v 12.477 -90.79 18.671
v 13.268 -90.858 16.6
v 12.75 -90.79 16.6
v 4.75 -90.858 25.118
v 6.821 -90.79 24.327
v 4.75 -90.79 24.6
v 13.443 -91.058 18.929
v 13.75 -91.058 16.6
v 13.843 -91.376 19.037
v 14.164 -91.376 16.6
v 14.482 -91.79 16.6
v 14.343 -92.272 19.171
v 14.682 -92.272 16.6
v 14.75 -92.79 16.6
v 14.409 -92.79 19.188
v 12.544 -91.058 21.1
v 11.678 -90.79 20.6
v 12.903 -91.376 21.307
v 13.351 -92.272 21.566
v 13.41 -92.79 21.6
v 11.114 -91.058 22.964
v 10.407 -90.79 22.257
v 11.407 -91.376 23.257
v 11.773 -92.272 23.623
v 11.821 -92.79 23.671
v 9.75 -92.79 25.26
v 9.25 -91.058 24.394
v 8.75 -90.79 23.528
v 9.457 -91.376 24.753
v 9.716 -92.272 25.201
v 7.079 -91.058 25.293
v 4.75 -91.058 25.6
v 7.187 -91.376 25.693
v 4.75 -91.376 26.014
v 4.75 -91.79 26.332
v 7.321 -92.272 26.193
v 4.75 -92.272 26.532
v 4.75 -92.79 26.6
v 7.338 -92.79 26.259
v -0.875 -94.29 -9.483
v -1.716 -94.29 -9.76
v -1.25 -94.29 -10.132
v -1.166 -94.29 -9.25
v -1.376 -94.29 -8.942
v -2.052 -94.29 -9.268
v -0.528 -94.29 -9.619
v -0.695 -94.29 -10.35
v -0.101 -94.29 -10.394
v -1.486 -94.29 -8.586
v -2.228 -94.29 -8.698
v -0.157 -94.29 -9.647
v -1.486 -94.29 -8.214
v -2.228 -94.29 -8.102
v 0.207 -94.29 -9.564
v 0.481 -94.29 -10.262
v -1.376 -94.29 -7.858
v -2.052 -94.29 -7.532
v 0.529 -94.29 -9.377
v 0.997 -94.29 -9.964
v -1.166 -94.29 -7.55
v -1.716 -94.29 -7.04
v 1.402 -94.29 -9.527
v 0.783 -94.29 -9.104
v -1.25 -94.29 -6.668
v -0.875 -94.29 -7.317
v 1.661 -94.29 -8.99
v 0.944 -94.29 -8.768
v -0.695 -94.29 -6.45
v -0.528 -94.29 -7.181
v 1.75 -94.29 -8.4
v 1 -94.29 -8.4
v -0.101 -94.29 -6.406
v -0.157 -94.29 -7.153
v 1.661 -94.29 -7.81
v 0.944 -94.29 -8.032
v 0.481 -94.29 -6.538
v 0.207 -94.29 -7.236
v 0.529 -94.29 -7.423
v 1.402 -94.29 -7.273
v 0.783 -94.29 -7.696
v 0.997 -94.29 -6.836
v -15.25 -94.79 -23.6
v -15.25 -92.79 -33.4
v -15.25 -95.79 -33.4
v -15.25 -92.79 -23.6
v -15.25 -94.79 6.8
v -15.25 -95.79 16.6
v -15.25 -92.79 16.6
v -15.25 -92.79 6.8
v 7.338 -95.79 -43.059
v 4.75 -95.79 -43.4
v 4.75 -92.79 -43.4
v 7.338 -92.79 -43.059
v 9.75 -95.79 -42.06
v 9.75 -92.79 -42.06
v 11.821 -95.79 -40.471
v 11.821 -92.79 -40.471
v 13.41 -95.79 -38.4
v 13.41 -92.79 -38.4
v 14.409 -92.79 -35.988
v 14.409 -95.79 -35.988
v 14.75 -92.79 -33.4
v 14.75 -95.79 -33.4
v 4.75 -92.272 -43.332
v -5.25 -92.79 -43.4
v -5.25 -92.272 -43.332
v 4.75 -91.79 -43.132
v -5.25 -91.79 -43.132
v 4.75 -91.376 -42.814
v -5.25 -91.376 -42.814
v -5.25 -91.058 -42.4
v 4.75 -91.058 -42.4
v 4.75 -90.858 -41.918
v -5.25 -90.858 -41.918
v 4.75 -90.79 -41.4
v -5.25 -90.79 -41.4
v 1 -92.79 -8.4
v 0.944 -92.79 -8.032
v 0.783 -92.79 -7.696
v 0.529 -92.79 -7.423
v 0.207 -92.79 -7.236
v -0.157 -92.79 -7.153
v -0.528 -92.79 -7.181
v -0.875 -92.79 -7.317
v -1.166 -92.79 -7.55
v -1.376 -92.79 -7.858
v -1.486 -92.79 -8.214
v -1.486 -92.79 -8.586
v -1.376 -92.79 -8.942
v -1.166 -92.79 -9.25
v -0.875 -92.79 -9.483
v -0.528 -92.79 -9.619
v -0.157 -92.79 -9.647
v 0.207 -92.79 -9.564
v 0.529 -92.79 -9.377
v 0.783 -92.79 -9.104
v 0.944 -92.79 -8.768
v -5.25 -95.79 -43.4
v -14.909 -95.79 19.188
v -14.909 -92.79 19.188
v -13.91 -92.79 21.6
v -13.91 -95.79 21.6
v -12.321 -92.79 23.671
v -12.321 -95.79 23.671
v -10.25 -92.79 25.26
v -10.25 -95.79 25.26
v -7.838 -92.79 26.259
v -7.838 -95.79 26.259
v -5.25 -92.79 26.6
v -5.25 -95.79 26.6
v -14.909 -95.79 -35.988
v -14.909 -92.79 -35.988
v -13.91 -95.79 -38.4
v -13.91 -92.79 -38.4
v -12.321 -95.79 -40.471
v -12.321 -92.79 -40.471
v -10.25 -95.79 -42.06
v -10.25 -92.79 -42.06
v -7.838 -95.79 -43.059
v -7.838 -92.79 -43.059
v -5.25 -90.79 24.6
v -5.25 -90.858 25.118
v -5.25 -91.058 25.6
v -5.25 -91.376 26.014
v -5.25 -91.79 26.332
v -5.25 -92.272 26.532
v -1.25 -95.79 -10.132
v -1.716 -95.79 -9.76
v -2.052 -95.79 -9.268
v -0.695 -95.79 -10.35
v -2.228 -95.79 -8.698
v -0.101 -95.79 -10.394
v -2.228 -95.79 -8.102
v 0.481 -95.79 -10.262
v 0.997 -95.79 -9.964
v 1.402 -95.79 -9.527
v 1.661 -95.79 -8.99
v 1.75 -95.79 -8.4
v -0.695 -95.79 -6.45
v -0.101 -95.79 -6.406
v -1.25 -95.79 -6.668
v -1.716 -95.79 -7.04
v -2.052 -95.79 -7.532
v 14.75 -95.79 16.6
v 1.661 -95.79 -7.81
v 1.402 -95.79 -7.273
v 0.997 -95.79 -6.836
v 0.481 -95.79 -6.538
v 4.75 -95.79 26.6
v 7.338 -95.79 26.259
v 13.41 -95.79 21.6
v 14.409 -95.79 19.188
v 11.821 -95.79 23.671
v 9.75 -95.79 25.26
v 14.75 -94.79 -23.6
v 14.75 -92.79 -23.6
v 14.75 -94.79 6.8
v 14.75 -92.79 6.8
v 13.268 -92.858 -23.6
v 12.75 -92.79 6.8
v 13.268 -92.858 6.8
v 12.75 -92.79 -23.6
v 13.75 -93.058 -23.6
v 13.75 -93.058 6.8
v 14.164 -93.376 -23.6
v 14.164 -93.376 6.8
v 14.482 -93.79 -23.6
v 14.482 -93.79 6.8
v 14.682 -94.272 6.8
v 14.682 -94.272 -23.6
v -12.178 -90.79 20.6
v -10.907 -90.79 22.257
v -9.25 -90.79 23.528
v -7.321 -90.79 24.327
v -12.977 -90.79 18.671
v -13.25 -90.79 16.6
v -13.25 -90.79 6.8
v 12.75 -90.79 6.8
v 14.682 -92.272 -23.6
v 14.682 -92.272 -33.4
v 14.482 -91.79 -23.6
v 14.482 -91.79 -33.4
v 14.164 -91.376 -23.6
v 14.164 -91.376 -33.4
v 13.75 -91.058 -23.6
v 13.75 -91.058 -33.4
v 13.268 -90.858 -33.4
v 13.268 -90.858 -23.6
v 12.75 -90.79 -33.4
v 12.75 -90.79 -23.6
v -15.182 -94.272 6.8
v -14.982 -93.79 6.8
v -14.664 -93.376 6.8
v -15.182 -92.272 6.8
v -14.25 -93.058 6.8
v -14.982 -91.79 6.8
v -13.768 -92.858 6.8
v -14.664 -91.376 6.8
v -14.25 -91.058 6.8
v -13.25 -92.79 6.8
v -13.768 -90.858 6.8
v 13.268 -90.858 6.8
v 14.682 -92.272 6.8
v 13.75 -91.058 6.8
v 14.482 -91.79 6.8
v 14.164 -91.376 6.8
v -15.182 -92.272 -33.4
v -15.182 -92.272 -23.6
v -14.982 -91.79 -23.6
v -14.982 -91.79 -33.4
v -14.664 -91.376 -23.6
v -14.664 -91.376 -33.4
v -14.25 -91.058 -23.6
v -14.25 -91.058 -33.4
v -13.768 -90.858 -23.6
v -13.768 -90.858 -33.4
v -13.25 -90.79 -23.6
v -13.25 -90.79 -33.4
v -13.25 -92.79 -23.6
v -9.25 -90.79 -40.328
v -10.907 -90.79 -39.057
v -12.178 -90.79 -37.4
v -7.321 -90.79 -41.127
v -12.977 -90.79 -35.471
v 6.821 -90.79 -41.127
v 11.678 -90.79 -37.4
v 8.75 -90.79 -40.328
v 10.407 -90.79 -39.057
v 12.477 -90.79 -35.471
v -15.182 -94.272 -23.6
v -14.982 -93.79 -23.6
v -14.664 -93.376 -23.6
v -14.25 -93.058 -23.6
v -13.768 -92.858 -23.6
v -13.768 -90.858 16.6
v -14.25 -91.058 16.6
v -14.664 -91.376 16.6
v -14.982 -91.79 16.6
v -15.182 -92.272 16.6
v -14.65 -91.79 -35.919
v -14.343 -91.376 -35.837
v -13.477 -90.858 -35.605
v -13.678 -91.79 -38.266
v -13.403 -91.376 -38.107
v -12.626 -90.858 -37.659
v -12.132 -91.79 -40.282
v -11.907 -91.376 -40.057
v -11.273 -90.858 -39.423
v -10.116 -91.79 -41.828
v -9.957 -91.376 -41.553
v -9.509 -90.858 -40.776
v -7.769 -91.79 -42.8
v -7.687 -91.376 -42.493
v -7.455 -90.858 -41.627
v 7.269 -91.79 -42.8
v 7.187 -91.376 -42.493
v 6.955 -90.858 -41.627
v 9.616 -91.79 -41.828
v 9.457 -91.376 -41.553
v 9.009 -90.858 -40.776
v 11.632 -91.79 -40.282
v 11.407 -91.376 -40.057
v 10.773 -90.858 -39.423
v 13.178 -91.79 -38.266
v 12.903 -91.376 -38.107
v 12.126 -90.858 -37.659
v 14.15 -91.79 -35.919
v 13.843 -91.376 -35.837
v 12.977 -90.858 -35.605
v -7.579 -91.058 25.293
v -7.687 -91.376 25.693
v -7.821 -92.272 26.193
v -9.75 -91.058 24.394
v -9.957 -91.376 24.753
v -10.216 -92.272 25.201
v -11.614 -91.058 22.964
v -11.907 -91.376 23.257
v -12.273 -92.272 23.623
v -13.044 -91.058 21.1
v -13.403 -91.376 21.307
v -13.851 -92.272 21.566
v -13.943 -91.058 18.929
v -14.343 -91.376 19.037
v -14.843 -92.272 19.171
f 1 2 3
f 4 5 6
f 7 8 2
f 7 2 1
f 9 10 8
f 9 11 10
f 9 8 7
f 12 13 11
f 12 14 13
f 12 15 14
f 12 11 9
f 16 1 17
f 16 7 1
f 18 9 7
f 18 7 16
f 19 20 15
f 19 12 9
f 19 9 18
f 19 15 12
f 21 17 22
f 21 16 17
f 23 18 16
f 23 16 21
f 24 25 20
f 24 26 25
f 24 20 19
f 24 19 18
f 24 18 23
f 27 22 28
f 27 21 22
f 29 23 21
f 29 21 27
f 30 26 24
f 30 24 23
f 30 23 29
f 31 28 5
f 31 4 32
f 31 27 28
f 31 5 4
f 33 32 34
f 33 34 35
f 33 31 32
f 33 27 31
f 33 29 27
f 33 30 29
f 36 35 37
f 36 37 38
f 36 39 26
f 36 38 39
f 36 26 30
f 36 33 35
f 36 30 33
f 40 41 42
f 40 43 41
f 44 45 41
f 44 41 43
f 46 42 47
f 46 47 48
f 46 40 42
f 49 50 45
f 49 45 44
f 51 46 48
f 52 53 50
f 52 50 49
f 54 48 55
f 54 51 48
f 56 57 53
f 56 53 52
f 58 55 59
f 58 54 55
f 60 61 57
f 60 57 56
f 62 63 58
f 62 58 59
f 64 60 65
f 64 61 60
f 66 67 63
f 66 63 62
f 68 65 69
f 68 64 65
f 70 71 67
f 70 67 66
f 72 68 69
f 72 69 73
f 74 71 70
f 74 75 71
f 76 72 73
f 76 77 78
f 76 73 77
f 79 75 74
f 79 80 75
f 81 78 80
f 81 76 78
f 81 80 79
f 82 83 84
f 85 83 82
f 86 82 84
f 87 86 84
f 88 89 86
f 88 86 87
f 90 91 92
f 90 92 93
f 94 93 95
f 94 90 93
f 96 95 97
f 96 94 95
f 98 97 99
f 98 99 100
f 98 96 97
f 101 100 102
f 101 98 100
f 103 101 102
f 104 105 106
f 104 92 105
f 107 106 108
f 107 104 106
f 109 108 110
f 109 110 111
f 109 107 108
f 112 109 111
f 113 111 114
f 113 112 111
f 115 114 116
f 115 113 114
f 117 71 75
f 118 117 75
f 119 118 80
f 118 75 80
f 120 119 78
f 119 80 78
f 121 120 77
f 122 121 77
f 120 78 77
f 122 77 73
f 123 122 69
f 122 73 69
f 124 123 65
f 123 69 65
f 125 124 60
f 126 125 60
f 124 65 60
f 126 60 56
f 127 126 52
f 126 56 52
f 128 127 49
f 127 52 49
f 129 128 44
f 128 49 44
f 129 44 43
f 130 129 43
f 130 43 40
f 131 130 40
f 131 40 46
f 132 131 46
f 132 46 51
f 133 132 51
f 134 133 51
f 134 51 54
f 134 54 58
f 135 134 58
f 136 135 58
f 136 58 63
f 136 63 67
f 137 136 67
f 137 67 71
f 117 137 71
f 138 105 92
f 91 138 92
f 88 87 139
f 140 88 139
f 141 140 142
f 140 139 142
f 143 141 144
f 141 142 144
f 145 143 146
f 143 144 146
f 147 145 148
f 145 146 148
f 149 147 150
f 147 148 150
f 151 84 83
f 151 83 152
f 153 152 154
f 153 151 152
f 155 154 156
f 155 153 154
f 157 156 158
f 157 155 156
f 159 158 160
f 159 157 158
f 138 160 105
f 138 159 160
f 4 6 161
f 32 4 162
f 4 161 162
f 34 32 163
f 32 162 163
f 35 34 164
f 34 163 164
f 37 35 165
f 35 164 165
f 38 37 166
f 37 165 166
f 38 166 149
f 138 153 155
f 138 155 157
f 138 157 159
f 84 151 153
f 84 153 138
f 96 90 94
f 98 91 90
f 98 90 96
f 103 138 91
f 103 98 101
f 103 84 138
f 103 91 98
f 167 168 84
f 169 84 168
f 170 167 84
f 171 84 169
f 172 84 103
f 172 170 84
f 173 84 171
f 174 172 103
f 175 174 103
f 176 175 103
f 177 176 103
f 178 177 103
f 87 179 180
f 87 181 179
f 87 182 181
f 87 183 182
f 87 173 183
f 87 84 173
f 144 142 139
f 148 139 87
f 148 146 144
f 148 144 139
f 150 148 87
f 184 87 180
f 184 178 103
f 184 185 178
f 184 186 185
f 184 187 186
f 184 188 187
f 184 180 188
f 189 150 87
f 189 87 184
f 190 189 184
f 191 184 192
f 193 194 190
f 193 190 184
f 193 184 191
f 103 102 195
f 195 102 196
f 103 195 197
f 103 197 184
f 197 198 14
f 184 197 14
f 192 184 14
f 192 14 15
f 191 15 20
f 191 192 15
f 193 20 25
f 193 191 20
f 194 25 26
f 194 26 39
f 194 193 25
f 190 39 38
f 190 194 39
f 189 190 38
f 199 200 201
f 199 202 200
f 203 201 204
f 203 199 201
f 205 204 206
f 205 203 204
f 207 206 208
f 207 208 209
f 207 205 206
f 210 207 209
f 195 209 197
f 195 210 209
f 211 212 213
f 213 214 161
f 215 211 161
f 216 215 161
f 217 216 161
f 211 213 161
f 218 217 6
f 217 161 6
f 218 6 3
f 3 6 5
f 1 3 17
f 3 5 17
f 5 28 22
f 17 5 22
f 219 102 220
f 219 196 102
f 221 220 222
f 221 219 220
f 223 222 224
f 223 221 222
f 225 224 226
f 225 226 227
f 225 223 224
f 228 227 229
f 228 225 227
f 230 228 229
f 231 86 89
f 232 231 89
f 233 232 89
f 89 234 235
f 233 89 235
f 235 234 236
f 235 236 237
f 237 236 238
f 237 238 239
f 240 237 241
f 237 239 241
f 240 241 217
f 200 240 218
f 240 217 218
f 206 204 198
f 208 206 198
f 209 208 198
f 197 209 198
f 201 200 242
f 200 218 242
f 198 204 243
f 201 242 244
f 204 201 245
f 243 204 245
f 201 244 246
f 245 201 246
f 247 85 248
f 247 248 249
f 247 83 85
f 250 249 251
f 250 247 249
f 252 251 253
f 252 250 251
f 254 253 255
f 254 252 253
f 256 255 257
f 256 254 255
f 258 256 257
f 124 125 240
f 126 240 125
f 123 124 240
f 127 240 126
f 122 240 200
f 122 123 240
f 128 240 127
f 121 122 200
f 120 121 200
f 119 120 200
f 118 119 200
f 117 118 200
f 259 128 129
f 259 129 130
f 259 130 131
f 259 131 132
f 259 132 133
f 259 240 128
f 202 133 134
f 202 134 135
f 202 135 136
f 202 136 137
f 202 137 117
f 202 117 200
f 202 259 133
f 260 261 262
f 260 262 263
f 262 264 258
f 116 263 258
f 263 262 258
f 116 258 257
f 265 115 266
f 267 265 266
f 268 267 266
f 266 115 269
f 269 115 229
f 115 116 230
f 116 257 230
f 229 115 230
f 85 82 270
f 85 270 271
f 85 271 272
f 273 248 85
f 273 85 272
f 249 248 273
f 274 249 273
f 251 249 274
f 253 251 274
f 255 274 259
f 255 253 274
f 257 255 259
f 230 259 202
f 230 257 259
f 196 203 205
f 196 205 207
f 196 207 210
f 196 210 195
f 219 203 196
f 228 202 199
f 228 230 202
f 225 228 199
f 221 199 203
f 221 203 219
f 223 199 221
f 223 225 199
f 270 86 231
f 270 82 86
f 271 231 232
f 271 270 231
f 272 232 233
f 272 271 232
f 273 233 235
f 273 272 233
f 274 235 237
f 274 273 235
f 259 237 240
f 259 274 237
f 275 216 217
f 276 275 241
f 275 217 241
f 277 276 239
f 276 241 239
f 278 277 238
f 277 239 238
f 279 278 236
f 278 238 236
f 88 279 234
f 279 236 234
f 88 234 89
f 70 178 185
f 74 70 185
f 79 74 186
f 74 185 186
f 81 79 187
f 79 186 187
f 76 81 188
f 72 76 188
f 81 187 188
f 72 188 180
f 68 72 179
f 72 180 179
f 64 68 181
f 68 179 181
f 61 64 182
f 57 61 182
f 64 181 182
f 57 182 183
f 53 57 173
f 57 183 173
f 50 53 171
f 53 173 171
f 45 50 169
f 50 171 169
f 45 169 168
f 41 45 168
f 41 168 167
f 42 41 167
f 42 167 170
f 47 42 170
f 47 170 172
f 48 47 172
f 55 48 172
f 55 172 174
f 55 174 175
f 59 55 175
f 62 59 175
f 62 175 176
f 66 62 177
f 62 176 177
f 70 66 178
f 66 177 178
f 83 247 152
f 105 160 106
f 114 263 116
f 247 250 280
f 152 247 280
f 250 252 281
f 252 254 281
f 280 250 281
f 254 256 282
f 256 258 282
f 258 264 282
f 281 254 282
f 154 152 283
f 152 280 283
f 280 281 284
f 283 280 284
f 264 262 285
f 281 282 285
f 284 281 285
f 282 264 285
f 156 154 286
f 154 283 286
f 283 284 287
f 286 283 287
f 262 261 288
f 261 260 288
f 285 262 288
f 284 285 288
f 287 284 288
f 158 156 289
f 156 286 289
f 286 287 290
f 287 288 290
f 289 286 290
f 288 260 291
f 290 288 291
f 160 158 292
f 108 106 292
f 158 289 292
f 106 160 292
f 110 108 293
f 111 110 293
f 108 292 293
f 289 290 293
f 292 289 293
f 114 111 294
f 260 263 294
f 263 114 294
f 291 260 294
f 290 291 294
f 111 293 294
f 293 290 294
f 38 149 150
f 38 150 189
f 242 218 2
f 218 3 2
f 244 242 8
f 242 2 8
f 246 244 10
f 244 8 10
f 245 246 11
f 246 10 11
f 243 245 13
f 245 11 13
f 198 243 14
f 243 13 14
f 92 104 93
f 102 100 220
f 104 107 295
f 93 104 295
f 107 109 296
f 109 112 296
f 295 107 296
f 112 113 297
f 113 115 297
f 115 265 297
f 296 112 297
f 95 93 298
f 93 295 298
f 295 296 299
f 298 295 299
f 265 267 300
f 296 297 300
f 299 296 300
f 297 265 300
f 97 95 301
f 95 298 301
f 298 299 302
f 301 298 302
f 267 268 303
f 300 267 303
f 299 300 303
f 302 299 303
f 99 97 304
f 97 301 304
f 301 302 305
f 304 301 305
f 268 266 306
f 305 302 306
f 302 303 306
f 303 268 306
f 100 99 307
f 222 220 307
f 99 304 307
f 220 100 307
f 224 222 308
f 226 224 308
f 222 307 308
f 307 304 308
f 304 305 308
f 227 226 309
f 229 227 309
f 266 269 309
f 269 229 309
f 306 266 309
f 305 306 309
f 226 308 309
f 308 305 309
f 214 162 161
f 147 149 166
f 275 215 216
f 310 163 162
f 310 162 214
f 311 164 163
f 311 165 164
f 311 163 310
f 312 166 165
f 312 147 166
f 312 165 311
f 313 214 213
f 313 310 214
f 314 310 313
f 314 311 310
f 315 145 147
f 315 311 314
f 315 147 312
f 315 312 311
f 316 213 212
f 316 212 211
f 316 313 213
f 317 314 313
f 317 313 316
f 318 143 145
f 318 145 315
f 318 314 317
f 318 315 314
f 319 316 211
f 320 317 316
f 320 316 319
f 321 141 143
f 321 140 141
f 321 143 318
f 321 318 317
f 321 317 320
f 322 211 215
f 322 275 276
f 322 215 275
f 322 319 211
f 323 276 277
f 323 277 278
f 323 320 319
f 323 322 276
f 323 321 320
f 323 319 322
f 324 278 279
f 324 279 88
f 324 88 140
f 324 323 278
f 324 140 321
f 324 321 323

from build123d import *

# Parameters (mm, degrees)
SKETCH016_W     = 30
SKETCH016_H     = 70
PAD006_DEPTH    = 5
FILLET007_R     = 10
SKETCH017_W     = 30
SKETCH017_H     = 30.4
POCKET018_DEPTH = 2
FILLET008_R     = 2
FILLET009_R     = 2
SKETCH018_R     = 1.25
POCKET019_DEPTH = 9
SKETCH019_R     = 2
POCKET020_DEPTH = 1.5


with BuildPart() as part:
    # Sketch016 → Pad006 (new body)
    with BuildSketch(Plane.XZ):
        Rectangle(SKETCH016_W, SKETCH016_H)
    extrude(amount=PAD006_DEPTH)

    # Fillet007
    fillet007_edges = [part.edges().sort_by_distance(p)[0] for p in [
        (15, -2.5, -35),
        (-15, -2.5, -35),
        (15, -2.5, 35),
        (-15, -2.5, 35),
    ]]
    fillet(fillet007_edges, radius=FILLET007_R)

    # Sketch017 (on Face2 of Fillet007) → Pocket018 (cut)
    with BuildSketch(Plane(origin=(0, 0, 0), x_dir=(1, 0, 0), z_dir=(0, 1, 0))):
        Rectangle(SKETCH017_W, SKETCH017_H)
    extrude(amount=-POCKET018_DEPTH, mode=Mode.SUBTRACT)

    # Fillet008
    fillet008_edges = [part.edges().sort_by_distance(p)[0] for p in [
        (15, -2, 0),
        (-15, -2, 0),
    ]]
    fillet(fillet008_edges, radius=FILLET008_R)

    # Fillet009
    fillet009_edges = [part.edges().sort_by_distance(p)[0] for p in [
        (15, 0, -20.1),
        (15, 0, 20.1),
    ]]
    fillet(fillet009_edges, radius=FILLET009_R)

    # Sketch018 (on Face4 of Fillet009) → Pocket019 (cut)
    with BuildSketch(Plane.XZ.offset(5)):
        Circle(SKETCH018_R)
    extrude(amount=-POCKET019_DEPTH, mode=Mode.SUBTRACT)

    # Sketch019 (on Face4 of Pocket019) → Pocket020 (cut)
    with BuildSketch(Plane.XZ.offset(5)):
        Circle(SKETCH019_R)
    extrude(amount=-POCKET020_DEPTH, mode=Mode.SUBTRACT)


with BuildPart() as part_1:
    # Body003 placement: moved
    add(part.part.moved(Location((-0.25, -90.79, -8.4))))


solid = part_1.part
